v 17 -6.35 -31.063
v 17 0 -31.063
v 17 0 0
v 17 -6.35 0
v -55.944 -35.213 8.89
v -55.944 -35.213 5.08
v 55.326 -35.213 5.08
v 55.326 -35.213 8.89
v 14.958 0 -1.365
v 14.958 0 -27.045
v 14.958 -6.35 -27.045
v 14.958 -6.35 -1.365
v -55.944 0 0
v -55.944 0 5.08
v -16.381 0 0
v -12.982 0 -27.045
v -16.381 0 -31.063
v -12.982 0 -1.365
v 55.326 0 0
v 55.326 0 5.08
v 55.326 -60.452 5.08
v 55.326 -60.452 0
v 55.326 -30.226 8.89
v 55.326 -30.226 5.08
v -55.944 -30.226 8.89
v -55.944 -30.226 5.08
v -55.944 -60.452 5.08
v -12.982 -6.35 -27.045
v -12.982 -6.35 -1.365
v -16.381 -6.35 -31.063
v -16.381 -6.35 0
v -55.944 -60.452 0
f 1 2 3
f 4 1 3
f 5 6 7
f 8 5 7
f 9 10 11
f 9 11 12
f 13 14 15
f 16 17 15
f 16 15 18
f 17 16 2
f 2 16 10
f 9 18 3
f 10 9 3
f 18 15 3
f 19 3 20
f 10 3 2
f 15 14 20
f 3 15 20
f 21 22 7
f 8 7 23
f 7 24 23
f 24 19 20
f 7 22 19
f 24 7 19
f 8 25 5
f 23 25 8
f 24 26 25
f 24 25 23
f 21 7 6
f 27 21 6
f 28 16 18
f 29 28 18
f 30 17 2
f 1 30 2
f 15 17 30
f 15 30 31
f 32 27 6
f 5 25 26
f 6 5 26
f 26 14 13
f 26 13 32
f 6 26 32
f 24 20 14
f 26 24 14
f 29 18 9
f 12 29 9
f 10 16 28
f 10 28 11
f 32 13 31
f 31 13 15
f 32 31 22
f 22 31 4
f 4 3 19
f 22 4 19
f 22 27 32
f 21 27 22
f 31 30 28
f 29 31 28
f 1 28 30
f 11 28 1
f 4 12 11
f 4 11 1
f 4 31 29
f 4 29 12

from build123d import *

# Parameters (mm, degrees)
F0_W     = 33.381108
F0_H     = 31.062972
F0_W_2   = 27.94
F0_H_2   = 25.6794
F1_DEPTH = 6.35
F2_DEPTH = 60.452
F3_W     = 111.270344
F3_H     = 4.986666
F4_DEPTH = 3.81


with BuildPart() as f1:
    # F0 (on Front) → F1 (new body)
    with BuildSketch(Plane.XZ):
        with Locations((0.309085, -15.531486)):
            Rectangle(F0_W, F0_H)
        with Locations((0.988458, -14.205176)):
            Rectangle(F0_W_2, F0_H_2, mode=Mode.SUBTRACT)
    extrude(amount=F1_DEPTH)

    # F0 (on Front) → F2 (join)
    with BuildSketch(Plane.XZ):
        Polygon((-55.94426, 5.08), (-55.94426, 0), (-16.381469, 0), (16.999639, 0), (55.326084, 0), (55.326084, 5.08), align=None)
    extrude(amount=F2_DEPTH)

    # F3 (on face) → F4 (join)
    with BuildSketch(Plane.XY.offset(5.08)):
        with Locations((-0.309088, -32.719333)):
            Rectangle(F3_W, F3_H)
    extrude(amount=F4_DEPTH)


solid = f1.part
